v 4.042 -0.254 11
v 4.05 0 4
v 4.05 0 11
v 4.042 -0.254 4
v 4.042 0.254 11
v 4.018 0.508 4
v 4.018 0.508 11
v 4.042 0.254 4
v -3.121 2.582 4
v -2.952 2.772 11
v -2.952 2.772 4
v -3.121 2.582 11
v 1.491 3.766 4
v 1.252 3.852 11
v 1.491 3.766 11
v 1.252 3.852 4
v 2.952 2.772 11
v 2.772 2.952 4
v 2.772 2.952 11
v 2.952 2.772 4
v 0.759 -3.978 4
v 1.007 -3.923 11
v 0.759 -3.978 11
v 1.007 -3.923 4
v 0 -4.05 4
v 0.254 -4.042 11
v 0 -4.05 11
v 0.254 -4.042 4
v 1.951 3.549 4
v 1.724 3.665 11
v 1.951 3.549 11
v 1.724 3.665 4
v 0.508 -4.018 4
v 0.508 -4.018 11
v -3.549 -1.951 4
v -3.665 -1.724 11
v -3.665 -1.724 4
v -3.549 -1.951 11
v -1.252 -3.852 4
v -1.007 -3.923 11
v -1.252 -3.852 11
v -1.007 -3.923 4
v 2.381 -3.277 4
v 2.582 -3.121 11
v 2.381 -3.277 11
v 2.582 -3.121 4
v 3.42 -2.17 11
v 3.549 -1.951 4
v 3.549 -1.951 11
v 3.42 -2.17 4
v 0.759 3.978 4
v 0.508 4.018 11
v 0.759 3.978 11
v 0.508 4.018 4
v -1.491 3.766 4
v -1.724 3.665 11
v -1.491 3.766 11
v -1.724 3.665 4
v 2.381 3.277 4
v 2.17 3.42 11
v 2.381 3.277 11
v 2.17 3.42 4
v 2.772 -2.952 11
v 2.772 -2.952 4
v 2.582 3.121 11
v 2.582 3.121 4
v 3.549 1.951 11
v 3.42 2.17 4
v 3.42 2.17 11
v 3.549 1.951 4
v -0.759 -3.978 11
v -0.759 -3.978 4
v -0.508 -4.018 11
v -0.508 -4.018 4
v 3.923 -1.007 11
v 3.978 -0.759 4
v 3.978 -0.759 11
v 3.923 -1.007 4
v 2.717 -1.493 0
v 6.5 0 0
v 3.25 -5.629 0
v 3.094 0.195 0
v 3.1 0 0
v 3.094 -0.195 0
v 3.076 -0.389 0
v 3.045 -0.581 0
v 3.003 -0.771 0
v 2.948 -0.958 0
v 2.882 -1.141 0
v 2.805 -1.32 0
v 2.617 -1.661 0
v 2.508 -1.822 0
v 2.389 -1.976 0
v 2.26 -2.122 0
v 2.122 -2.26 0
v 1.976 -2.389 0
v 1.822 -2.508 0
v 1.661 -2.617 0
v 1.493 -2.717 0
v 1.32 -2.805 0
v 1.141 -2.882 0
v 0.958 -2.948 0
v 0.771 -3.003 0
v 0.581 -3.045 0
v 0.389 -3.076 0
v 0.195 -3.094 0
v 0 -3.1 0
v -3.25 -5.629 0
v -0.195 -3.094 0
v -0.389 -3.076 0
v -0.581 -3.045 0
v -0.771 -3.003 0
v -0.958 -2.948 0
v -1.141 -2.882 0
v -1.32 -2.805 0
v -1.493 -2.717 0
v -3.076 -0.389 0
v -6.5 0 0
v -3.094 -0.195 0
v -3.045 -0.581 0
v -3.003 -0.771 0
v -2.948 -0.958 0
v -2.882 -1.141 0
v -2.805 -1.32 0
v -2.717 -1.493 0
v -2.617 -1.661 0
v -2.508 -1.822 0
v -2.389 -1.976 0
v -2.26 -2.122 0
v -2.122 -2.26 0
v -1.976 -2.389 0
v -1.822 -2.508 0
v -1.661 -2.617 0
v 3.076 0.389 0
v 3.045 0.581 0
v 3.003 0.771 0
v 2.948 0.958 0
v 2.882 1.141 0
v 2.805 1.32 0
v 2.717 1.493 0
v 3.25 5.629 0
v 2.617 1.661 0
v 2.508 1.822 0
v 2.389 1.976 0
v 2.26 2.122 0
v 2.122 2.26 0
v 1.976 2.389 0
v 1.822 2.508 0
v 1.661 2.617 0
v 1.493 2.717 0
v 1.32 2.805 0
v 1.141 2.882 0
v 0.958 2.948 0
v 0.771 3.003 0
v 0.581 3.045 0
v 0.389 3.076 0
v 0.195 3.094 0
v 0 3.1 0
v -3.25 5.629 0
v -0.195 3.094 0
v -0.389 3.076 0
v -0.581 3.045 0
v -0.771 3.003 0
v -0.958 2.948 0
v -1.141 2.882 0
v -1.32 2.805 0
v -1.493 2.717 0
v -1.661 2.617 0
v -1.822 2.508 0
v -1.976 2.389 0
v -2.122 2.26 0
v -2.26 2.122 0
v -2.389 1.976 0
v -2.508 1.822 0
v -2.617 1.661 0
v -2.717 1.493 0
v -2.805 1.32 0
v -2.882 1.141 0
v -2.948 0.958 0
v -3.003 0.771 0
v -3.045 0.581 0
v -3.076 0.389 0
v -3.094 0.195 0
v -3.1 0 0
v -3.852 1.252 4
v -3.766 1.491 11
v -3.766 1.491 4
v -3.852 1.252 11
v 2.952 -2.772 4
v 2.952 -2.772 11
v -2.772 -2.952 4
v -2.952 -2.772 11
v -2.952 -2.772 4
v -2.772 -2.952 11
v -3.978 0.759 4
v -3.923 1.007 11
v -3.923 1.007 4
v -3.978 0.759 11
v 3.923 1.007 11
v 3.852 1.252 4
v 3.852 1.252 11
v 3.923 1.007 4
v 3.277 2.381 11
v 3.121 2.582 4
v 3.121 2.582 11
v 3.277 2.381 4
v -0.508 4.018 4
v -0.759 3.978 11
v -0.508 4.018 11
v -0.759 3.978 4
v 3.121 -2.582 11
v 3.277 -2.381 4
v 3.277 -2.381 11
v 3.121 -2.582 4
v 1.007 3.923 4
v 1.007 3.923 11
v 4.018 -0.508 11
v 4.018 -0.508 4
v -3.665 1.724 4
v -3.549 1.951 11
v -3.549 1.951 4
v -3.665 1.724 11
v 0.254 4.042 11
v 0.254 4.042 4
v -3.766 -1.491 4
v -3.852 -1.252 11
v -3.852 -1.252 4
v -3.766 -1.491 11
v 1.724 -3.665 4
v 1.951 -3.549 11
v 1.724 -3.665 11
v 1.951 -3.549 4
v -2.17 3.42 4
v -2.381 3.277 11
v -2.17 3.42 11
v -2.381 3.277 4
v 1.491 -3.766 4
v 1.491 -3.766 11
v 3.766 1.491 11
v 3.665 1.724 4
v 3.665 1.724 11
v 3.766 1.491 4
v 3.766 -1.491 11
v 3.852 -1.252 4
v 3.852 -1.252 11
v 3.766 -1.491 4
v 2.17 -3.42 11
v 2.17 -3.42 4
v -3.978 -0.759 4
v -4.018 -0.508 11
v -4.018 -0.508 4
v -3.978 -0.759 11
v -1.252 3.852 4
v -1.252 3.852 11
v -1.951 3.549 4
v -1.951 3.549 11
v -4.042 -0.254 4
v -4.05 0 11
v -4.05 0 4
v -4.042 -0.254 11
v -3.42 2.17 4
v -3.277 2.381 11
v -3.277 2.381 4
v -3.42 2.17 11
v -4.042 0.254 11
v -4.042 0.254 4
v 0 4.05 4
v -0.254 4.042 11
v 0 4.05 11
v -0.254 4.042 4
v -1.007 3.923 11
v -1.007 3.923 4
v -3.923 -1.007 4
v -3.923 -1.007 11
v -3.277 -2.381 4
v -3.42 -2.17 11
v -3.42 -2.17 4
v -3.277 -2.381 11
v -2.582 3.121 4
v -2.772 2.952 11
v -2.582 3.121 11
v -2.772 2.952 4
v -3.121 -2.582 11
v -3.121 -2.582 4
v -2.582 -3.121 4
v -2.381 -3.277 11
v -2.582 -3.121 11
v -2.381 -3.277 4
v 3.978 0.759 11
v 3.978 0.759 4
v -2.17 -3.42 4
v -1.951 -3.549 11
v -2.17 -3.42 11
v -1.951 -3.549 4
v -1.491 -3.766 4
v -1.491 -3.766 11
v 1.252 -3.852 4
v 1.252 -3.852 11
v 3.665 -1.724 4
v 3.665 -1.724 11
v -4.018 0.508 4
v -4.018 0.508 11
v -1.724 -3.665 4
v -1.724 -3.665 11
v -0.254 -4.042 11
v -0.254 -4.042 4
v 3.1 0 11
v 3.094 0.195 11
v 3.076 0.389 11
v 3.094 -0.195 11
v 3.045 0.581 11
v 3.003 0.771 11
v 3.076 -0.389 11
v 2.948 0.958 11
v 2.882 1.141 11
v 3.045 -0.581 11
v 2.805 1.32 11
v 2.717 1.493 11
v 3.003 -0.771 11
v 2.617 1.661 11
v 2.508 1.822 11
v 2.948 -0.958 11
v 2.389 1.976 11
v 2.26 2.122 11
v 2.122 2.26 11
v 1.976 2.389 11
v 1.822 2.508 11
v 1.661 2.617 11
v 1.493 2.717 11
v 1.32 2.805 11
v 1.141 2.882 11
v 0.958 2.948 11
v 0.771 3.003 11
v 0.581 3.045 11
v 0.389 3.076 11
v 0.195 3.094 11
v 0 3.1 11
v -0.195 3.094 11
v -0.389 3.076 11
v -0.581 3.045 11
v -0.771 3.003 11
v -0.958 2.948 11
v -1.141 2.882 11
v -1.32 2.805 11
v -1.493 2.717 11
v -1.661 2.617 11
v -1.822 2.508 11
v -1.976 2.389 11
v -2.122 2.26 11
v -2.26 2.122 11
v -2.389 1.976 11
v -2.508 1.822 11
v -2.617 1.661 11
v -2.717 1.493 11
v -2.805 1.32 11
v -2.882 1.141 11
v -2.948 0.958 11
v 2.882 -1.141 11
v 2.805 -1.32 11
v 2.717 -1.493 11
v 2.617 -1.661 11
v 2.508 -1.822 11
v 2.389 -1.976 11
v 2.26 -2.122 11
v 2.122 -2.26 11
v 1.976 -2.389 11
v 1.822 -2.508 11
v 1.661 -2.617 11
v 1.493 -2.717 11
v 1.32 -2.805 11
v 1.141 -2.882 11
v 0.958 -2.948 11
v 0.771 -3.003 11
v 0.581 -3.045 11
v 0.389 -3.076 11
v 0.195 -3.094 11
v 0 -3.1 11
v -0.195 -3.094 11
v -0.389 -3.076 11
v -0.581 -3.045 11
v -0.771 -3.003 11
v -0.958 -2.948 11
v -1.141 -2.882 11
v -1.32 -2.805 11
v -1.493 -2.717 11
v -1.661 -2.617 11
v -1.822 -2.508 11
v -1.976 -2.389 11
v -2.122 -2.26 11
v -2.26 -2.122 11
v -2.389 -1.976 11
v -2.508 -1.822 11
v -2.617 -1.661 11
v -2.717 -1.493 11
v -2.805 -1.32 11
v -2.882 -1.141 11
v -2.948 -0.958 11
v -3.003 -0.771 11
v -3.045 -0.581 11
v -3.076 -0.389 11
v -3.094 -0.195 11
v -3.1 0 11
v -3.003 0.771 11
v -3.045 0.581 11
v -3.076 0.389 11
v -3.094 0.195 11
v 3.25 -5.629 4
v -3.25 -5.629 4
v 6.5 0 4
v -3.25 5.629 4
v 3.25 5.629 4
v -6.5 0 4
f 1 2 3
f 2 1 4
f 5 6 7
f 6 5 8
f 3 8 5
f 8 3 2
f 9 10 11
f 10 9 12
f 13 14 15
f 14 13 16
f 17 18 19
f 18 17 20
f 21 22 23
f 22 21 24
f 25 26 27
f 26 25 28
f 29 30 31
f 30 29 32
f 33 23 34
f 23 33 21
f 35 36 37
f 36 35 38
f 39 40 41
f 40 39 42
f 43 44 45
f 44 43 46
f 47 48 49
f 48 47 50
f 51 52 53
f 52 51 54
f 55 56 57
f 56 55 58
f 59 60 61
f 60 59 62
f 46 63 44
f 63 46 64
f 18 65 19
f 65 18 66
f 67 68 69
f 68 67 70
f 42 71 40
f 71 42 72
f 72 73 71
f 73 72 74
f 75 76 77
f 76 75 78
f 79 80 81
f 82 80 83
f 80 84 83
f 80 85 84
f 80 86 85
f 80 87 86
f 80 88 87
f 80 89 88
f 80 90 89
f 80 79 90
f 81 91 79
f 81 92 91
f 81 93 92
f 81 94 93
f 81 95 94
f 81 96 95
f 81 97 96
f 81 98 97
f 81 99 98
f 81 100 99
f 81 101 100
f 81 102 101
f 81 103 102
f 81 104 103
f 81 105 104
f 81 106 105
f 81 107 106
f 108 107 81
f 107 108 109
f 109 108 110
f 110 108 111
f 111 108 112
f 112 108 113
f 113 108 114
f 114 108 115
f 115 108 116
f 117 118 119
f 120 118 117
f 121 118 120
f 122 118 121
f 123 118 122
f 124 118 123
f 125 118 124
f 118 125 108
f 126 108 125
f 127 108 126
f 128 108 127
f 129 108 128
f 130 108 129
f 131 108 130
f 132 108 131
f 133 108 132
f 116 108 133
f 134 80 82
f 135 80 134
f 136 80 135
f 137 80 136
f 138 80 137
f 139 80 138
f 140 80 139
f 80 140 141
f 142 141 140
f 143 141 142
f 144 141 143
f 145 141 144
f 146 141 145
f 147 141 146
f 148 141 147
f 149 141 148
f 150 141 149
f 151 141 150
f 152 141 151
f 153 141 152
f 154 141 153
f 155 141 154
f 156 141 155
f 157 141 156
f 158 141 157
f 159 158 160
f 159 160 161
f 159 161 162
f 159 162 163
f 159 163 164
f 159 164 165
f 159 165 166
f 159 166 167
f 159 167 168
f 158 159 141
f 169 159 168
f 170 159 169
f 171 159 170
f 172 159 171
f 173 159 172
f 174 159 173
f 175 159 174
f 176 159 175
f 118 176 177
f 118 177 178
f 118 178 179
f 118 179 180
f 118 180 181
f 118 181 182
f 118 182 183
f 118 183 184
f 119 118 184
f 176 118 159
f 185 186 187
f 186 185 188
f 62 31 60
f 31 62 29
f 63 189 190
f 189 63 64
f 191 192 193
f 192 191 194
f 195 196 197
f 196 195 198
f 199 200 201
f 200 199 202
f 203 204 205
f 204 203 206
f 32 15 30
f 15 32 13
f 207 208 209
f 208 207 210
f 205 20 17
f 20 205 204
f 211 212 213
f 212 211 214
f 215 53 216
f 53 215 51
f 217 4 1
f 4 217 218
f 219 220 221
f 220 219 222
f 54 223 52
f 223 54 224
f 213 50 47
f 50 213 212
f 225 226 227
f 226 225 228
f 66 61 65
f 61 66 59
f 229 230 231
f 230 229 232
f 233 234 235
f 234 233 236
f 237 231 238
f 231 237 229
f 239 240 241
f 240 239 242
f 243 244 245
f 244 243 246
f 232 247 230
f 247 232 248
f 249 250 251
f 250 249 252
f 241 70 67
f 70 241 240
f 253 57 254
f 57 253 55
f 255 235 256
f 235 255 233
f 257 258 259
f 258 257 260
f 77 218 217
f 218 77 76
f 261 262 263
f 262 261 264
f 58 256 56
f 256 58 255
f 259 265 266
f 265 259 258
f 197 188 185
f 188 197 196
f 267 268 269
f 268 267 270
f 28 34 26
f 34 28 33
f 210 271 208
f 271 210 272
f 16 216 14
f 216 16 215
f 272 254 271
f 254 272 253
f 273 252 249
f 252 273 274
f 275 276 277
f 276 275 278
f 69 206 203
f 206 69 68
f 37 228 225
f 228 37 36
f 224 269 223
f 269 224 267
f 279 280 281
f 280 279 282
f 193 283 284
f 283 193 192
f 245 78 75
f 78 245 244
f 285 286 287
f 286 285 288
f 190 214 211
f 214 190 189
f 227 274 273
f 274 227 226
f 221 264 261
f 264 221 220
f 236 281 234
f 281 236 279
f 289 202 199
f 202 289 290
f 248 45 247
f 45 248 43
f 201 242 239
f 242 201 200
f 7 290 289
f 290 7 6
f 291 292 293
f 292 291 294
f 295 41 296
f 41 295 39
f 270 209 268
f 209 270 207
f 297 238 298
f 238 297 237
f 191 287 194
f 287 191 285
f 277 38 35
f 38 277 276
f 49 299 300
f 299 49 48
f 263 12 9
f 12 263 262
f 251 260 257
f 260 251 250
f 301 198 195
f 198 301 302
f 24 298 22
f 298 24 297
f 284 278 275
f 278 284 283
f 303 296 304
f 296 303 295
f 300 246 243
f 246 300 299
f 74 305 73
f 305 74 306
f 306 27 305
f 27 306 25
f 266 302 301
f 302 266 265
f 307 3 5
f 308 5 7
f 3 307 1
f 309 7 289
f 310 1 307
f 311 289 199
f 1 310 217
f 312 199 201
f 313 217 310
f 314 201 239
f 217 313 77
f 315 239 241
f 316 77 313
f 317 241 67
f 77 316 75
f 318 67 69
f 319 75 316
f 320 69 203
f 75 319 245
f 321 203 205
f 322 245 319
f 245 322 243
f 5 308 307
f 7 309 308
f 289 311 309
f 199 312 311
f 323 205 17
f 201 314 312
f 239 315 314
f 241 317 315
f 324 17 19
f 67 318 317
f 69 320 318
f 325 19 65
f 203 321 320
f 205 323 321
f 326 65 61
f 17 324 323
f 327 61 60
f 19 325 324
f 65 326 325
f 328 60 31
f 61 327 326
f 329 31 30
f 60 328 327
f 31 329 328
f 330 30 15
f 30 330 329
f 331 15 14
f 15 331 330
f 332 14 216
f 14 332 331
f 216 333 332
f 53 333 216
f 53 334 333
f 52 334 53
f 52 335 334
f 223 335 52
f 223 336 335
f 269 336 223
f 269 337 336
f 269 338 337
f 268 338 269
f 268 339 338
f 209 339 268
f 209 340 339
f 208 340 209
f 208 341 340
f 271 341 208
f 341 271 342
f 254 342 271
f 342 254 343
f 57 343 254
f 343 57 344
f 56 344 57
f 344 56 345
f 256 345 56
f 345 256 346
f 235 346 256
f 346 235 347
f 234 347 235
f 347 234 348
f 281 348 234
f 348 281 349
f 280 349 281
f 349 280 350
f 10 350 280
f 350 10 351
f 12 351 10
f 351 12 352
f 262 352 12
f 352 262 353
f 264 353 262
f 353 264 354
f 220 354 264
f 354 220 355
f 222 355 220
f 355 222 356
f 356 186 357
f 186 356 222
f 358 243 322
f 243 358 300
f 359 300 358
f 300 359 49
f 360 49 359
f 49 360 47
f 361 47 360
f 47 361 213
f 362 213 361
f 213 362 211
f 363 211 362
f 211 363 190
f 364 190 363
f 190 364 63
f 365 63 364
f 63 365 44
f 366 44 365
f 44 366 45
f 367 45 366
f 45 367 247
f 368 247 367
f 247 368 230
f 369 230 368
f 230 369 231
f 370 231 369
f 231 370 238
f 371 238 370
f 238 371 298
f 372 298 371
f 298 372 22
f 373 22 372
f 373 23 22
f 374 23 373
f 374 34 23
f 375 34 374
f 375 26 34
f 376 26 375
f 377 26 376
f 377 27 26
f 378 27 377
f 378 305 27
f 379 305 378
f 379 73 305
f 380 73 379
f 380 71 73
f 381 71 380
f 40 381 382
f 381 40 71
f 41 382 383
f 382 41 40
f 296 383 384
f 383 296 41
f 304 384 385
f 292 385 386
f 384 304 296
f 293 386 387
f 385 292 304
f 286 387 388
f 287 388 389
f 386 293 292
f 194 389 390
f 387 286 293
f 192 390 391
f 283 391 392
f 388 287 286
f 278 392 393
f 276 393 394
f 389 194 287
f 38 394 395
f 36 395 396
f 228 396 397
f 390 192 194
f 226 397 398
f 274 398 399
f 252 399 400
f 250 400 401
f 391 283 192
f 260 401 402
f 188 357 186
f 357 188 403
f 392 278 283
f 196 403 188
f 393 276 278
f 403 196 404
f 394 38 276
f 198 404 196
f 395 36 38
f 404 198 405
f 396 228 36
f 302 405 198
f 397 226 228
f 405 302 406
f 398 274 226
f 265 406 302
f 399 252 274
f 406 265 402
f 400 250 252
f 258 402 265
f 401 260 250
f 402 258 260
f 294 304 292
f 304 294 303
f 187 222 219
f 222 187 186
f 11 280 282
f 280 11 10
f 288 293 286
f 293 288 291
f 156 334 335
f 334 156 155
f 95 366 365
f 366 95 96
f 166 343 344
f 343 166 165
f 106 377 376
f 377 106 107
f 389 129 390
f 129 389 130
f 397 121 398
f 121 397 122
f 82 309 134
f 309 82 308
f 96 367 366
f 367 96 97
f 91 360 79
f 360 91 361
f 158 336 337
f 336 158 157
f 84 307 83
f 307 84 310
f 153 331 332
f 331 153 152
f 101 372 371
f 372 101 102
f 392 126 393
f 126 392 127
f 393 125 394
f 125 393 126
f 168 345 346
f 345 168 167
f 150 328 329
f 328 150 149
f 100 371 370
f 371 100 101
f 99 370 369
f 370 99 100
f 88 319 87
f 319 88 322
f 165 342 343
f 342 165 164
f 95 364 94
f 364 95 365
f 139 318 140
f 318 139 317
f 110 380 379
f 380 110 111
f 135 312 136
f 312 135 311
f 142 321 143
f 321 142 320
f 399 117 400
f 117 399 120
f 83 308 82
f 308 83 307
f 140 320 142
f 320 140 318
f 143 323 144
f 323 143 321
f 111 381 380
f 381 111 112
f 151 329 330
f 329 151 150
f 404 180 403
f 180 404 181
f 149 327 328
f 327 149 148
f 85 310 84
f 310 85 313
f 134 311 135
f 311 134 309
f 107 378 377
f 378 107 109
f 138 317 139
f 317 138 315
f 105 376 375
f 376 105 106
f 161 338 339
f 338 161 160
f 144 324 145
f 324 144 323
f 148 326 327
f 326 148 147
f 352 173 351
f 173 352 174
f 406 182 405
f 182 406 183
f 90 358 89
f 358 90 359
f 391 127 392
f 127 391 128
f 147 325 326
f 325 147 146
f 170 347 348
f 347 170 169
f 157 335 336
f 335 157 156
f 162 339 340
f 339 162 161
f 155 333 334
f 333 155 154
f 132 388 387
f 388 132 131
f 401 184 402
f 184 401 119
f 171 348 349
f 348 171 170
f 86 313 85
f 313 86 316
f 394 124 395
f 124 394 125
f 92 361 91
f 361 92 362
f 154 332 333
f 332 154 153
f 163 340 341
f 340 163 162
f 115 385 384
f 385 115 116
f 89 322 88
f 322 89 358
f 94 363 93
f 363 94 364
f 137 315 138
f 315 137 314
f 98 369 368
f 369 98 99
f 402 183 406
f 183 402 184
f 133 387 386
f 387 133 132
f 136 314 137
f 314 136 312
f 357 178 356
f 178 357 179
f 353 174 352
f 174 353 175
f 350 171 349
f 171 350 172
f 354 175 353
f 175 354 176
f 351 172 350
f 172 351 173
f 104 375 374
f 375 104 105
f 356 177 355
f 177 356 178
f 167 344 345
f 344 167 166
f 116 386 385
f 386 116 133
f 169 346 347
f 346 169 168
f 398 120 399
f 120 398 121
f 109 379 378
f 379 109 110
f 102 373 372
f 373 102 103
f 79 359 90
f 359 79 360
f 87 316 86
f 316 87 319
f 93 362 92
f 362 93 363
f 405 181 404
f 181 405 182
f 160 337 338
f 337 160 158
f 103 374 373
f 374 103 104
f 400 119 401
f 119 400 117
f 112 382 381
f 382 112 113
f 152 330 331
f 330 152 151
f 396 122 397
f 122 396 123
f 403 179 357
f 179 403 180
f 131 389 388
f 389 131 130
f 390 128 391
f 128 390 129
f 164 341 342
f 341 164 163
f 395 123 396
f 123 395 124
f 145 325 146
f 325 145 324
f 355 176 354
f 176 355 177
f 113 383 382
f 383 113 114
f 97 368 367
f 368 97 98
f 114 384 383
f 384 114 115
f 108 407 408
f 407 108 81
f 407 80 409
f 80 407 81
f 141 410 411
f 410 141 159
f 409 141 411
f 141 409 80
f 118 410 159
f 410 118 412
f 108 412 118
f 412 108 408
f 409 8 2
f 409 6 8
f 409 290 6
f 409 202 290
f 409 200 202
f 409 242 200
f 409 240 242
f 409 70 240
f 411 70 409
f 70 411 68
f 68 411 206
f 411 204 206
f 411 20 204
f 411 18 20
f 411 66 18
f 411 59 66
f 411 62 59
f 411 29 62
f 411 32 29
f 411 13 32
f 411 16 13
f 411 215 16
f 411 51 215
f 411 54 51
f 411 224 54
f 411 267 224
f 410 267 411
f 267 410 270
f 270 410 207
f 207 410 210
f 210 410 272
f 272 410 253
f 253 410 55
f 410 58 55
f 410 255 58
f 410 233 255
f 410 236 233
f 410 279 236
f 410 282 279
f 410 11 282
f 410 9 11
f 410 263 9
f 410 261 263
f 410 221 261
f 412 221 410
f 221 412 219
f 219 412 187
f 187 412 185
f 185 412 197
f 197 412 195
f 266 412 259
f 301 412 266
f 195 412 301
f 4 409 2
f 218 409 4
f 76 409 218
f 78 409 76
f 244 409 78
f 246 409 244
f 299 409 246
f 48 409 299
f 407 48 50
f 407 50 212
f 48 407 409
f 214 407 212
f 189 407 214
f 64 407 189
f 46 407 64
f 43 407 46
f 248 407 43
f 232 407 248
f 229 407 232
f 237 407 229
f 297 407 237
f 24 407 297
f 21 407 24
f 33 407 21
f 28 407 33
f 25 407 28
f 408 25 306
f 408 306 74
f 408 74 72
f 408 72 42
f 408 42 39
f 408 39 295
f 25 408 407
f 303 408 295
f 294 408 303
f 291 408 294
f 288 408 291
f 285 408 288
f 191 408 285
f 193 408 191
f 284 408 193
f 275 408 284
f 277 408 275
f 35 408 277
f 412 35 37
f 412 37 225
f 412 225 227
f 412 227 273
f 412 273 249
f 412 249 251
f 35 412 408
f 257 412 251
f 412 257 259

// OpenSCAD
// ===  6mm to 8mm shaft adaptor
// ===  J.Beale July 18 2014

D1 = 8.1;	// OD: fit inside 8mm bearing (7.9: measure 7.7)
D2 = 6.2;	// ID:  allow 5.8 mm OD threaded rod in (5.6 => 5.15)
D3 = 13;    // OD: flange on one end
L1 = 11;    // overall length
L2 = 4;     // height of flange portion
// DSS = 2.6;  // diameter for M3 setscrew with some thread bite
HSS = 4;    // z-height from center of hole for M3 setscrew

// ==========================================================
fn = 100;	// number of facets on cylinder
eps = 0.05; // a small number

module adapt1() {
 translate([0,0,L1/2])
  difference() {
		cylinder(r=D1/2,h=L1,center=true,$fn=fn); // outer shell
		// translate([0,0,-eps]) 
         cylinder(r=D2/2,h=L1+eps,center=true,$fn=fn); // inner bore
	   // translate([0,0,HSS]) rotate([0,90,0])cylinder(r=DSS/2,h=D1*2,$fn=20,center=true); // setscrew #1
	   // translate([0,0,-HSS]) rotate([0,-90,0]) cylinder(r=DSS/2,h=D1*2,$fn=20); // setscrew #2
  }
} // end module


module flange() {
 translate([0,0,L2/2])
  difference() {
    cylinder(r=D3/2,h=L2,center=true,$fn=6); // hex flange
    cylinder(r=D2/2,h=L1+eps,center=true,$fn=fn); // inner bore

 }
}

adapt1();
flange();
